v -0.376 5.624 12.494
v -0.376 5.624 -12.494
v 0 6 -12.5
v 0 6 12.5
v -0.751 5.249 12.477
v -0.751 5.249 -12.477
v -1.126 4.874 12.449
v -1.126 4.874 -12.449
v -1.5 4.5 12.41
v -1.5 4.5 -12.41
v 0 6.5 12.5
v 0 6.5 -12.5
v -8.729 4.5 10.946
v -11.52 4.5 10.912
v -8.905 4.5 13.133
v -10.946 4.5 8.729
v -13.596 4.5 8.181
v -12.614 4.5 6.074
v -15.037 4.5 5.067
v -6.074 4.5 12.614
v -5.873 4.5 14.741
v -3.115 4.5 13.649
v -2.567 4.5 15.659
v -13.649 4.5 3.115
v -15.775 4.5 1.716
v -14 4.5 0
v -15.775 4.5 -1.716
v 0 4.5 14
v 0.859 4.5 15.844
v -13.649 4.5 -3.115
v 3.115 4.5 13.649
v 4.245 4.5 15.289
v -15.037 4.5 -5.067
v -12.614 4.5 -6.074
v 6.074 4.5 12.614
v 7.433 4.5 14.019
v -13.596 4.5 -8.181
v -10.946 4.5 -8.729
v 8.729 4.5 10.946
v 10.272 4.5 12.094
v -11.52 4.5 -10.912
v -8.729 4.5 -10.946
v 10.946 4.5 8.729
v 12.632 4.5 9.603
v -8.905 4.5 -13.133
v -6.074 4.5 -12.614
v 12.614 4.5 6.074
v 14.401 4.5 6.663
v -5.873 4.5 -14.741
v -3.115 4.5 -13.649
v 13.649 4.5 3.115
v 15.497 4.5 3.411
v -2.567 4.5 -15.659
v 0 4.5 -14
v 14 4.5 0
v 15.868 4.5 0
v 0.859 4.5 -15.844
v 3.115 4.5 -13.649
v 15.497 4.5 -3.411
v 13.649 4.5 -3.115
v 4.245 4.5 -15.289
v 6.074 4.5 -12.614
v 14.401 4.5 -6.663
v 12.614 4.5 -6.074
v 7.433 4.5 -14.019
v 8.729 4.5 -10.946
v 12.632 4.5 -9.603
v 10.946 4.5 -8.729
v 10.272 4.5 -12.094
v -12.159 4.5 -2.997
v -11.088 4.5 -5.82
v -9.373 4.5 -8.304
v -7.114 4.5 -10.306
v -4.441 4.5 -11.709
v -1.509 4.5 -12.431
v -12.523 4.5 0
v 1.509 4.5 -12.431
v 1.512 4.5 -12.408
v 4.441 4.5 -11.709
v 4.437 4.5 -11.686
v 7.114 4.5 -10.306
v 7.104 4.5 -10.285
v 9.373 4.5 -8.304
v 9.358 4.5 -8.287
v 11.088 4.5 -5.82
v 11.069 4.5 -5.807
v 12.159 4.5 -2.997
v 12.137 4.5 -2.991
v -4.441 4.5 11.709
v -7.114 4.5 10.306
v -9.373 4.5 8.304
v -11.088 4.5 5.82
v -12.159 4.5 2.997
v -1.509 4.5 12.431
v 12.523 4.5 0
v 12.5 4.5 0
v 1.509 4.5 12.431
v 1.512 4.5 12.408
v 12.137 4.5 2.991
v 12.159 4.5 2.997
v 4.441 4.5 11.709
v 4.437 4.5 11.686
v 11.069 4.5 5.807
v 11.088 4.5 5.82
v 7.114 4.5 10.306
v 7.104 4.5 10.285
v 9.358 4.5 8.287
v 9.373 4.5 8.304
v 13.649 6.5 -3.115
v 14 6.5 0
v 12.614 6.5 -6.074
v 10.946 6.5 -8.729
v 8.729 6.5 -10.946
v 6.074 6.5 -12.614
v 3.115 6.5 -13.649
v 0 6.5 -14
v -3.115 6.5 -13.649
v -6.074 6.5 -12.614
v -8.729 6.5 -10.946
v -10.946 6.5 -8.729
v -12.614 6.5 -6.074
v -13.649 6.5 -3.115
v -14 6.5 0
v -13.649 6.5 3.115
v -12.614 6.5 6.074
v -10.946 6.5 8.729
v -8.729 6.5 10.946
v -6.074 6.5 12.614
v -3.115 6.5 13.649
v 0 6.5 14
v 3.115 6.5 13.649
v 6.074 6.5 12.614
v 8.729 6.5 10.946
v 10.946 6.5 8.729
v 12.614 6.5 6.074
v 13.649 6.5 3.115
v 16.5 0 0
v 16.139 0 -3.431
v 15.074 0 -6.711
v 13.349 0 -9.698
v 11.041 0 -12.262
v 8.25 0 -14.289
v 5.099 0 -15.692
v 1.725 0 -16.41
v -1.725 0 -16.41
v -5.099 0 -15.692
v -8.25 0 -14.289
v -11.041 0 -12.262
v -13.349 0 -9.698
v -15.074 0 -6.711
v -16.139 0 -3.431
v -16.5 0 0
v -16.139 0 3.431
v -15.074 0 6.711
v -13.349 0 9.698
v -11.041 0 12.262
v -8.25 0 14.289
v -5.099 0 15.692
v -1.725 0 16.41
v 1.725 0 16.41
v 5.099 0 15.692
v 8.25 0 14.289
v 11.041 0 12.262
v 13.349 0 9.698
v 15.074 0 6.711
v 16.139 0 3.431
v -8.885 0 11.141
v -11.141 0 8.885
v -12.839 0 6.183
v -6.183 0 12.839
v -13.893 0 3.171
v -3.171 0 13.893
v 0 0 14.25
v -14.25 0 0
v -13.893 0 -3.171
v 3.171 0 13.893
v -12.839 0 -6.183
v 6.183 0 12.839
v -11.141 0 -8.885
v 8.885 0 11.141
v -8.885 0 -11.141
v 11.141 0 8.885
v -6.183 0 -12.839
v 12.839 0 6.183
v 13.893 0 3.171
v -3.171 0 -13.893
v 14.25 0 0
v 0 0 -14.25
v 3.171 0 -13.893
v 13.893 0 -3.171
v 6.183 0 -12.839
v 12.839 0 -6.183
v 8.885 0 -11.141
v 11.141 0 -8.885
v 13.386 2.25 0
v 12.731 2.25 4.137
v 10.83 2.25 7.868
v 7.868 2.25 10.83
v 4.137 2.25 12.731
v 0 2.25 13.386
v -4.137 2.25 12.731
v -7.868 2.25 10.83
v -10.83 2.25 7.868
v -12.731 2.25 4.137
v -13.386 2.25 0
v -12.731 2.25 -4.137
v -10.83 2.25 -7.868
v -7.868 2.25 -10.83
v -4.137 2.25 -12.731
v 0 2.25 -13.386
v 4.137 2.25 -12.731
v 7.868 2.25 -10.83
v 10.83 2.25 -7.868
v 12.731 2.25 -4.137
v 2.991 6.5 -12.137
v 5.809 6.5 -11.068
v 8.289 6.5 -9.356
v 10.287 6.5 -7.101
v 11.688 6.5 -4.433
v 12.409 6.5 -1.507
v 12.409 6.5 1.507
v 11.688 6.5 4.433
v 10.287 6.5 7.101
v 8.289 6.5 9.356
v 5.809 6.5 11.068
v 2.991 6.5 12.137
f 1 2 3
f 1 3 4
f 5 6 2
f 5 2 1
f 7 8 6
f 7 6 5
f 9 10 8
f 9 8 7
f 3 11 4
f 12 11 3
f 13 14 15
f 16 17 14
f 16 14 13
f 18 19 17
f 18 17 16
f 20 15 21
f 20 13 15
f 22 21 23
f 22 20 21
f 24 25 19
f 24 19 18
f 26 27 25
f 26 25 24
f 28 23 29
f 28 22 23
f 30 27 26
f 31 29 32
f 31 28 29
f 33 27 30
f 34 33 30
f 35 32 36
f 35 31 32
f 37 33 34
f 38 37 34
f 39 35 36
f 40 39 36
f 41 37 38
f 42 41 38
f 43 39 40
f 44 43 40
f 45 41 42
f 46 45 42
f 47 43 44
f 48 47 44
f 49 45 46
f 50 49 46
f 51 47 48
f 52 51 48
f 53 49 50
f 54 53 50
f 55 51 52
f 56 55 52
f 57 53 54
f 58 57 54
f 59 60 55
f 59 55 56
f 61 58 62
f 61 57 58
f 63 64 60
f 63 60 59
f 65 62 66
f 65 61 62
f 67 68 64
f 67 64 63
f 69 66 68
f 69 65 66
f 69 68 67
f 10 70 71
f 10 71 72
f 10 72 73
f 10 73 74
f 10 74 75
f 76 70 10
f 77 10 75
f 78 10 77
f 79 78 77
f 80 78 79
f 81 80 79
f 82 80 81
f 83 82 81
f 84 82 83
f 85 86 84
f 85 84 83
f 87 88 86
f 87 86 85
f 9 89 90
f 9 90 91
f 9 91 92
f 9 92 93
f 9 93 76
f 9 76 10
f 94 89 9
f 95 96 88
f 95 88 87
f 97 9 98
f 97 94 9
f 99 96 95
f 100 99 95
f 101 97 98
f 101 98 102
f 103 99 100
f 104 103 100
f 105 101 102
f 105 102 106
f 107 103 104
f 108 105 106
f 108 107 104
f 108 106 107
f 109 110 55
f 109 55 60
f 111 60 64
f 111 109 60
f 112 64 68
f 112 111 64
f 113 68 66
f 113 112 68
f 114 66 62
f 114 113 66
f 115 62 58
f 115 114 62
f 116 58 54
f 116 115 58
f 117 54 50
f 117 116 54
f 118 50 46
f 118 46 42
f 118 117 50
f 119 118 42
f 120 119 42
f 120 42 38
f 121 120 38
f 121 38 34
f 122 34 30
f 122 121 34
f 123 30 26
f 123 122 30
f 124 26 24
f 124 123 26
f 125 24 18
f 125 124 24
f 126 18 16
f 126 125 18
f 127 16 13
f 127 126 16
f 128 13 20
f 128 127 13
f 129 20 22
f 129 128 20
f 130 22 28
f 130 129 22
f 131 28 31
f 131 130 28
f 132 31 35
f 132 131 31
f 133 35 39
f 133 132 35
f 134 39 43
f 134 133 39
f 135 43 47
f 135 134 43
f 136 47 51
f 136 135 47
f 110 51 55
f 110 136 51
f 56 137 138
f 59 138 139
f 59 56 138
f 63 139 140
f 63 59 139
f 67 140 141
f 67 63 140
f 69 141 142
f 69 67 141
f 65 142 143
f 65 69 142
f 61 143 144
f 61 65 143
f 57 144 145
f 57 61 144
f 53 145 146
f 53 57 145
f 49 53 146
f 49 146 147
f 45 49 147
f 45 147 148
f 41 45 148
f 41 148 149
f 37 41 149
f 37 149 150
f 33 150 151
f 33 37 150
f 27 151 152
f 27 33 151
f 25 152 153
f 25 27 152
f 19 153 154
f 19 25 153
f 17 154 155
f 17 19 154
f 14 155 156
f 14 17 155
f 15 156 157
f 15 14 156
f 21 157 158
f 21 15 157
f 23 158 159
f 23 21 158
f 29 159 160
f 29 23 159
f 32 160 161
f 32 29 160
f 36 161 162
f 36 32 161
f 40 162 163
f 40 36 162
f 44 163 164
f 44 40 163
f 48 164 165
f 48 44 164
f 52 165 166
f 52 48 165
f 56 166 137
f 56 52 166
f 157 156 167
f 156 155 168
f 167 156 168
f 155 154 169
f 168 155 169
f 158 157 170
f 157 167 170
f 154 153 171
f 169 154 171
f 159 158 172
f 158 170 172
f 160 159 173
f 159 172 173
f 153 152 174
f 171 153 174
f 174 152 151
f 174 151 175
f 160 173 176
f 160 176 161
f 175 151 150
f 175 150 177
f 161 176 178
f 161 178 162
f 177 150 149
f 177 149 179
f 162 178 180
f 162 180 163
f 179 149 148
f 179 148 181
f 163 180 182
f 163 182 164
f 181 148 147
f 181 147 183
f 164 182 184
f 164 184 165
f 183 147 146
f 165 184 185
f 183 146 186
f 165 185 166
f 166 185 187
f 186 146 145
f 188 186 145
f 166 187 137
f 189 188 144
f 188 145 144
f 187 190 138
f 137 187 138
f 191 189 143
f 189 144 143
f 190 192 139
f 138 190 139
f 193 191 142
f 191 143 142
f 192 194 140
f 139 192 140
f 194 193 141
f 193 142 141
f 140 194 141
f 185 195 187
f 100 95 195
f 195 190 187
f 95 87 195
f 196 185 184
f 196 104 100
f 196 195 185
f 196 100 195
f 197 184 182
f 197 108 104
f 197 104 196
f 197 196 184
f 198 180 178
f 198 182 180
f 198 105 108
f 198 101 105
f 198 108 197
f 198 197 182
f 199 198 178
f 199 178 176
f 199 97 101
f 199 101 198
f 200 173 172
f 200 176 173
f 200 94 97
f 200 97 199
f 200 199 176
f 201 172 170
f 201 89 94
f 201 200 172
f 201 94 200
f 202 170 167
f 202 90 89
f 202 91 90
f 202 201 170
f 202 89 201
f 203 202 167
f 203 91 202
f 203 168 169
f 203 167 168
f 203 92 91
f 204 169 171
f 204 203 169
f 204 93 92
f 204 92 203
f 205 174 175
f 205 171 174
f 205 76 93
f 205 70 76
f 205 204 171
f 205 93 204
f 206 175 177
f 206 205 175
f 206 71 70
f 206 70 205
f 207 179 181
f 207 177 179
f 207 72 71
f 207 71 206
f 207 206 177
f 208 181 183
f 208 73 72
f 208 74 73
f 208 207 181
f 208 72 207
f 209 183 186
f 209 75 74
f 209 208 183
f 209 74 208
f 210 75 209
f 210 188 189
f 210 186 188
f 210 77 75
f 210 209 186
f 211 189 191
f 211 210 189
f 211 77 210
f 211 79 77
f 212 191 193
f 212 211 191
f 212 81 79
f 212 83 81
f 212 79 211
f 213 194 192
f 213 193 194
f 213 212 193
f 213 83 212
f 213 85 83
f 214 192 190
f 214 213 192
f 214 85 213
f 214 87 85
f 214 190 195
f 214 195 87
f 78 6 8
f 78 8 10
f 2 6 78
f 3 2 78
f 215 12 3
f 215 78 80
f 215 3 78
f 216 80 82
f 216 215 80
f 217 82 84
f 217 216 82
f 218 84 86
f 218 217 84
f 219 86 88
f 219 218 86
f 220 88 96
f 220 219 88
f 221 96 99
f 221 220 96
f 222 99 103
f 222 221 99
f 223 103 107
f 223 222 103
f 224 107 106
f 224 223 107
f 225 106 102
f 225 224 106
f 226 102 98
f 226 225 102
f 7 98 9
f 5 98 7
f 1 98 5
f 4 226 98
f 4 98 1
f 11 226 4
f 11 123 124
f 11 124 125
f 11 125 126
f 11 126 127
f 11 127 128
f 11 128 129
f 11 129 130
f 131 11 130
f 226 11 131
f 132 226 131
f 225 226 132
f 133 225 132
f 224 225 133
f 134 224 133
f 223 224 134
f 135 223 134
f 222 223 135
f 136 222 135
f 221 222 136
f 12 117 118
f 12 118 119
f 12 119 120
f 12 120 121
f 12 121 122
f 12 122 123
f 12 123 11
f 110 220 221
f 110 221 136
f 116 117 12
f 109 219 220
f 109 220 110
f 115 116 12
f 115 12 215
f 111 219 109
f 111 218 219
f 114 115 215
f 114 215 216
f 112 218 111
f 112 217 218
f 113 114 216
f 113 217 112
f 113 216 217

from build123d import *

# Parameters (mm, degrees)
SKETCH1_R           = 16.5
BOSS_EXTRUDE1_DEPTH = 6.5
BOSS_EXTRUDE1_TAPER = 8
SKETCH2_R           = 14.25
CUT_EXTRUDE1_DEPTH  = 4.5
CUT_EXTRUDE1_TAPER  = 21
CUT_EXTRUDE2_DEPTH  = 6
CHAMFER1_SIZE       = 1.5
SKETCH4_R           = 17.295094409
SKETCH4_R_2         = 14
CUT_EXTRUDE3_DEPTH  = 2


with BuildPart() as part:
    # Sketch1 → Boss-Extrude1 (new body)
    with BuildSketch(Plane(origin=(0, 0, 0), x_dir=(1, 0, 0), z_dir=(0, 1, 0))):
        Circle(SKETCH1_R)
    extrude(amount=BOSS_EXTRUDE1_DEPTH, taper=BOSS_EXTRUDE1_TAPER)

    # Sketch2 → Cut-Extrude1 (cut)
    with BuildSketch(Plane.XZ):
        Circle(SKETCH2_R)
    extrude(amount=-CUT_EXTRUDE1_DEPTH, taper=CUT_EXTRUDE1_TAPER, mode=Mode.SUBTRACT)

    # Sketch3 → Cut-Extrude2 (cut)
    with BuildSketch(Plane(origin=(0, 6.5, 0), x_dir=(1, 0, 0), z_dir=(0, 1, 0))):
        with BuildLine():
            Line((0, -12.5), (0, 12.5))
            ThreePointArc((0, 12.5), (12.5, 0), (0, -12.5))
        make_face()
    extrude(amount=-CUT_EXTRUDE2_DEPTH, mode=Mode.SUBTRACT)

    # Chamfer1
    chamfer1_edges = [part.edges().sort_by_distance(p)[0] for p in [
        (0, 4.5, 0),
    ]]
    chamfer(chamfer1_edges, length=CHAMFER1_SIZE)

    # Sketch4 → Cut-Extrude3 (cut)
    with BuildSketch(Plane(origin=(0, 6.5, 0), x_dir=(1, 0, 0), z_dir=(0, 1, 0))):
        Circle(SKETCH4_R)
        Circle(SKETCH4_R_2, mode=Mode.SUBTRACT)
    extrude(amount=-CUT_EXTRUDE3_DEPTH, mode=Mode.SUBTRACT)


solid = part.part
